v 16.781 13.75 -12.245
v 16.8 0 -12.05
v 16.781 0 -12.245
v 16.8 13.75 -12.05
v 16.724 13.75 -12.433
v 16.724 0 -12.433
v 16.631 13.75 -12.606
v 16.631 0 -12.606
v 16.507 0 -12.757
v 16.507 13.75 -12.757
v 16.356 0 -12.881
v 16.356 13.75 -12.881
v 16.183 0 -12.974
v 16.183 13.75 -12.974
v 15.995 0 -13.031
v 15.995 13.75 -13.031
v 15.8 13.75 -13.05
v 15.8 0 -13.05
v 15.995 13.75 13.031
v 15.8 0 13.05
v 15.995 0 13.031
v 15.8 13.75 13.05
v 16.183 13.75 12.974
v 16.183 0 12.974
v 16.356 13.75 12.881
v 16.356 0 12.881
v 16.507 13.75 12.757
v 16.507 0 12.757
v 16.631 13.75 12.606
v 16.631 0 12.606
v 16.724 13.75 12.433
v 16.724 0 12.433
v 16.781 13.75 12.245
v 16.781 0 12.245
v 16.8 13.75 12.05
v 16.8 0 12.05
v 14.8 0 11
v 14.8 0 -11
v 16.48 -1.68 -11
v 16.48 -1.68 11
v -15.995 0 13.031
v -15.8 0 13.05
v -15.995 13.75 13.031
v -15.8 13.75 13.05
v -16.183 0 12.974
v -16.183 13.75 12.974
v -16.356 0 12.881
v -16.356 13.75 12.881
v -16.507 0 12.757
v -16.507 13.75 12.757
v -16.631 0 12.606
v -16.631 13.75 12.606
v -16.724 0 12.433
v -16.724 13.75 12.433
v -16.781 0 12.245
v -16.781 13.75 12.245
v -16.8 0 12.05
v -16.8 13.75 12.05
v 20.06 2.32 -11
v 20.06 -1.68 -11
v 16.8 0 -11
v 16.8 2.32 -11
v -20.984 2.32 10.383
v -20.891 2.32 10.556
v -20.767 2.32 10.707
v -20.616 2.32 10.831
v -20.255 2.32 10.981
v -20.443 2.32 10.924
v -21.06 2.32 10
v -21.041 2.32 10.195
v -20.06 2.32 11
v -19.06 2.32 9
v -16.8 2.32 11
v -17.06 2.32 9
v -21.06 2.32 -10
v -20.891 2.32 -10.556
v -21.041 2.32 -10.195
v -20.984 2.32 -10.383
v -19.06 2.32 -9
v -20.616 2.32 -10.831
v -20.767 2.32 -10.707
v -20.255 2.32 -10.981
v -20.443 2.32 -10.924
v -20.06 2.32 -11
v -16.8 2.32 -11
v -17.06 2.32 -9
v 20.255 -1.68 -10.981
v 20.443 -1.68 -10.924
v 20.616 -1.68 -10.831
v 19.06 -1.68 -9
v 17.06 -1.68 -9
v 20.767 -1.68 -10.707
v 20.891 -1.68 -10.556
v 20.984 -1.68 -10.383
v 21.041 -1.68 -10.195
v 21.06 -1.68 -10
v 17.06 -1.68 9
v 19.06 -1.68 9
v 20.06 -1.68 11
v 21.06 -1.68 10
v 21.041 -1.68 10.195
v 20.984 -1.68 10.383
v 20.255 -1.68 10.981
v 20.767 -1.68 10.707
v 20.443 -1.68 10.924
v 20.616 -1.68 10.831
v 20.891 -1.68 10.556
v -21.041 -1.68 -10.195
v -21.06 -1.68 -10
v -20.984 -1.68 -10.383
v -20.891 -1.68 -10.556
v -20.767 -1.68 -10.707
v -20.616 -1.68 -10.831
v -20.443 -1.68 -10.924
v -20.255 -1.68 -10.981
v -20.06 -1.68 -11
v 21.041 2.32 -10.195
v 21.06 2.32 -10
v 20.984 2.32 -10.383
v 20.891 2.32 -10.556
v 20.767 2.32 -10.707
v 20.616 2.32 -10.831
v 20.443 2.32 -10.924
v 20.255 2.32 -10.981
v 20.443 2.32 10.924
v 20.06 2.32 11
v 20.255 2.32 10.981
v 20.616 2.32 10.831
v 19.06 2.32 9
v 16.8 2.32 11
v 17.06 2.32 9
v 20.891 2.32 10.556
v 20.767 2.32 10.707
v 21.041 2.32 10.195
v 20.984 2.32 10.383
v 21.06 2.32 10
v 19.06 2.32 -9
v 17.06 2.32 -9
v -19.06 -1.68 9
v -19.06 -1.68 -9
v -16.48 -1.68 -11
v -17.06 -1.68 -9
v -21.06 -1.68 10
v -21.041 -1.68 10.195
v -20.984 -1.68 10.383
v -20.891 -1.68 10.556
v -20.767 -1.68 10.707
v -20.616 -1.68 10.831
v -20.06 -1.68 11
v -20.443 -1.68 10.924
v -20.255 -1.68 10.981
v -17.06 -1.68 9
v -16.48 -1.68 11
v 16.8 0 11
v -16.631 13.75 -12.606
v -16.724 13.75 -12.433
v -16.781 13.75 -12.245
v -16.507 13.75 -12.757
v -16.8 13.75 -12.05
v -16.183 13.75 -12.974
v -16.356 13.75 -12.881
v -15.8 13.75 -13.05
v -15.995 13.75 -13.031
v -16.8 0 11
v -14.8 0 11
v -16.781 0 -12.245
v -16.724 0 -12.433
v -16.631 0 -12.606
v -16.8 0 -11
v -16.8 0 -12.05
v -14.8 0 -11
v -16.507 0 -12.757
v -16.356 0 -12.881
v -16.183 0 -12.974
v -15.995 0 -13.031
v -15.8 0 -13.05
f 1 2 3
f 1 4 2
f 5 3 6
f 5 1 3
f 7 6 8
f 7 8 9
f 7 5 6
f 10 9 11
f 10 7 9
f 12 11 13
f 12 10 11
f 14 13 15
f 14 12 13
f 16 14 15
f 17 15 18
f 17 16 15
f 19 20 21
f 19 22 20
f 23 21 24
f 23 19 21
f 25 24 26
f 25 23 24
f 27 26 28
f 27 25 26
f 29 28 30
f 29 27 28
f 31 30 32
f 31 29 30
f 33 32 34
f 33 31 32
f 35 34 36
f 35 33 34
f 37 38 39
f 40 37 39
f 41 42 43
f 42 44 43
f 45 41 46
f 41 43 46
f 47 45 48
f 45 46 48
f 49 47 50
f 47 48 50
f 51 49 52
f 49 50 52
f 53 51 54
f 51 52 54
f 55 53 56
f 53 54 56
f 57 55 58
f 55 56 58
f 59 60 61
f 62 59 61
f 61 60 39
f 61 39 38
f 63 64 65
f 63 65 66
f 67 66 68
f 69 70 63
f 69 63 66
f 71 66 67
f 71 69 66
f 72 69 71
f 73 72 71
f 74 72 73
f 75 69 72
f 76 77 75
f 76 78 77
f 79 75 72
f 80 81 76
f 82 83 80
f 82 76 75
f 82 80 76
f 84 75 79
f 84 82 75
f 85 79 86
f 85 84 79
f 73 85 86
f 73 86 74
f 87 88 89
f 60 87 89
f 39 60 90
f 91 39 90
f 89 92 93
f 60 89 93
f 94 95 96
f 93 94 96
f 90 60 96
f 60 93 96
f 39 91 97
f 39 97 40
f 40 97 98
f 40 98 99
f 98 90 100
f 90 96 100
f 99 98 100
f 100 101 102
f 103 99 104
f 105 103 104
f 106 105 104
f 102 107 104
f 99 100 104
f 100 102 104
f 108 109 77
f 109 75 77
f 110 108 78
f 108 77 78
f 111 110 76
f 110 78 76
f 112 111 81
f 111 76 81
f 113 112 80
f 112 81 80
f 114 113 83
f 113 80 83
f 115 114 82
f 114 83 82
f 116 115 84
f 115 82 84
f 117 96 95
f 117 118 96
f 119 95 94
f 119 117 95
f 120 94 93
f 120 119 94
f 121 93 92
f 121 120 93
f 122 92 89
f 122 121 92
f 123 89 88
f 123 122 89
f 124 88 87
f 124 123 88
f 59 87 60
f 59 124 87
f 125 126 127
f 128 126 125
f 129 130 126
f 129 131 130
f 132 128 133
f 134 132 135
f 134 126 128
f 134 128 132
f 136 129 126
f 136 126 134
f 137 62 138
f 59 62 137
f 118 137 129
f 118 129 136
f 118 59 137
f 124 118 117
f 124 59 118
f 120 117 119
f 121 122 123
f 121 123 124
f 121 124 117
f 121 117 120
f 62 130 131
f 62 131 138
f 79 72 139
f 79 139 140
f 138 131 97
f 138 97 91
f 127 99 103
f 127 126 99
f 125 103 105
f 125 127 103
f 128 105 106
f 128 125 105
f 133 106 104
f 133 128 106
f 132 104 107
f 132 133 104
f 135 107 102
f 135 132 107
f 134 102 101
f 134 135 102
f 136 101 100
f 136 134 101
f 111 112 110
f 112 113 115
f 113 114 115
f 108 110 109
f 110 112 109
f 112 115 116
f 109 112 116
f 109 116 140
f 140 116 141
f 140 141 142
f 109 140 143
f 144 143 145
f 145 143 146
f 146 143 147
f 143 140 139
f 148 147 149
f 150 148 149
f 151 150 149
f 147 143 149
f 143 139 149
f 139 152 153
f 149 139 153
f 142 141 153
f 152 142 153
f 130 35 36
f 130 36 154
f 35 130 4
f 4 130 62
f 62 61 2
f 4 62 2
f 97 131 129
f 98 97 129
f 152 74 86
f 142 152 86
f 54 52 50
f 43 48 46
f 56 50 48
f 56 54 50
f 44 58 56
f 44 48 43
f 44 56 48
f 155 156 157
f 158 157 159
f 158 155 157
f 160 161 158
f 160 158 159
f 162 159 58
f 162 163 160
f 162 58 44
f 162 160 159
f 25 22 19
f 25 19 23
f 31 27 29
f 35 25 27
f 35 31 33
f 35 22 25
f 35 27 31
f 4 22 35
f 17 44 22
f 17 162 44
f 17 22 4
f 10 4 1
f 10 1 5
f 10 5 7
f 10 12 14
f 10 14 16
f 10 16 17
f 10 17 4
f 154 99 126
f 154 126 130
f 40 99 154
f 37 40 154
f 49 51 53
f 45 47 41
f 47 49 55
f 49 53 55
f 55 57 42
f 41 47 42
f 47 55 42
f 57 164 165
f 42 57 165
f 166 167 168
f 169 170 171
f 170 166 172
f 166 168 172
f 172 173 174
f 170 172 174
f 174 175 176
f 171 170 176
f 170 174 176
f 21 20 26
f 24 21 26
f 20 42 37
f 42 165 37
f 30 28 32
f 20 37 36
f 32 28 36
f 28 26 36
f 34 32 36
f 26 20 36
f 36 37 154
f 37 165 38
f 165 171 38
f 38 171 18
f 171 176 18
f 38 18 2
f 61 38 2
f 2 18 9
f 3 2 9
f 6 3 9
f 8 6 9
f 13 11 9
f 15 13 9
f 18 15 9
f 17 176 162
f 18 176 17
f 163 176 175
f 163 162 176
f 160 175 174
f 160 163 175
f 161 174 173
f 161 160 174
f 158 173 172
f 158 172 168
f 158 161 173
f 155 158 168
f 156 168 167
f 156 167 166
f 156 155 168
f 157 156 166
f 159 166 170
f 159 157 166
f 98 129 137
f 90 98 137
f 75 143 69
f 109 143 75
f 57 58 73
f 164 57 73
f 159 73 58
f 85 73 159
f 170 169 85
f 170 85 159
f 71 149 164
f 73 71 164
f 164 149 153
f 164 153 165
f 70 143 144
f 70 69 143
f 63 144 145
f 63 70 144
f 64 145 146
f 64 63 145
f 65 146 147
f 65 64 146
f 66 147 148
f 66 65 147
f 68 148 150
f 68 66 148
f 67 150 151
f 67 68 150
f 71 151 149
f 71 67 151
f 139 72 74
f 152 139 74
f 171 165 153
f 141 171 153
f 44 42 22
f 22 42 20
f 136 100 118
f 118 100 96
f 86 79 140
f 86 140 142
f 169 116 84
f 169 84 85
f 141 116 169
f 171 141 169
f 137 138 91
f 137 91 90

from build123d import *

# Parameters (mm, degrees)
SKETCH1_W                = 33.6
SKETCH1_H                = 26.1
BOSS_EXTRUDE1_DEPTH      = 13.75
BOSS_EXTRUDE2_DEPTH      = 2.32
BOSS_EXTRUDE2_DEPTH_BACK = 1.68
SKETCH2_W                = 4.26
SKETCH2_H                = 22
SKETCH3_W                = 2
SKETCH3_H                = 18
CUT_EXTRUDE1_DEPTH       = 28.284995877
CHAMFER1_SIZE            = 2
FILLET1_R                = 1


with BuildPart() as part:
    # Sketch1 → Boss-Extrude1 (new body)
    with BuildSketch(Plane(origin=(0, 0, 0), x_dir=(1, 0, 0), z_dir=(0, 1, 0))):
        Rectangle(SKETCH1_W, SKETCH1_H)
    extrude(amount=BOSS_EXTRUDE1_DEPTH)

    # Sketch2 → Boss-Extrude2 (add, two sides: drawn at the far end of the back side and taken through both)
    with BuildSketch(Plane(origin=(0, 0, 0), x_dir=(1, 0, 0), z_dir=(0, 1, 0)).offset(-BOSS_EXTRUDE2_DEPTH_BACK)):
        with Locations((18.93, 0)):
            Rectangle(SKETCH2_W, SKETCH2_H)
        with Locations((-18.93, 0)):
            Rectangle(SKETCH2_W, SKETCH2_H)
    extrude(amount=BOSS_EXTRUDE2_DEPTH + BOSS_EXTRUDE2_DEPTH_BACK)

    # Sketch3 → Cut-Extrude1 (cut, through all)
    with BuildSketch(Plane(origin=(0, 2.32, 0), x_dir=(1, 0, 0), z_dir=(0, 1, 0))):
        with Locations((18.06, 0)):
            Rectangle(SKETCH3_W, SKETCH3_H)
        with Locations((-18.06, 0)):
            Rectangle(SKETCH3_W, SKETCH3_H)
    extrude(amount=-CUT_EXTRUDE1_DEPTH, mode=Mode.SUBTRACT)

    # Chamfer1
    # the kernel refuses this chamfer: 2 mm, written as the material it adds along each edge
    with BuildSketch(Plane(origin=(16.8, 0, -11), x_dir=(-0.9996219169112968, 0.027495876610586365, 0), z_dir=(0, 0, 1))) as chamfer1_piece_1_section:
        Polygon((CHAMFER1_SIZE * 0.999621916911, CHAMFER1_SIZE * 0.0274958766106), (-CHAMFER1_SIZE * 0.0274958766106, CHAMFER1_SIZE * 0.999621916911), (0, 0), align=None)
    chamfer1_piece_1 = extrude(amount=22, mode=Mode.PRIVATE)
    chamfer1_piece_1 = split(chamfer1_piece_1, bisect_by=Plane(origin=(16.11862069, -1.68, 0), z_dir=(0, 1, 0)), keep=Keep.TOP, mode=Mode.PRIVATE)
    add(chamfer1_piece_1)
    with BuildSketch(Plane(origin=(-16.8, 0, 11), x_dir=(0.9996219169112968, 0.027495876610586365, 0), z_dir=(0, 0, -1))) as chamfer1_piece_2_section:
        Polygon((CHAMFER1_SIZE * 0.999621916911, CHAMFER1_SIZE * 0.0274958766106), (-CHAMFER1_SIZE * 0.0274958766106, CHAMFER1_SIZE * 0.999621916911), (0, 0), align=None)
    chamfer1_piece_2 = extrude(amount=22, mode=Mode.PRIVATE)
    chamfer1_piece_2 = split(chamfer1_piece_2, bisect_by=Plane(origin=(-16.11862069, -1.68, 0), z_dir=(0, 1, 0)), keep=Keep.TOP, mode=Mode.PRIVATE)
    add(chamfer1_piece_2)

    # Fillet1
    fillet1_edges = [part.edges().sort_by_distance(p)[0] for p in [
        (21.06, 0.32, 11),
        (21.06, 0.32, -11),
        (-21.06, 0.32, -11),
        (-21.06, 0.32, 11),
        (-16.8, 6.875, -13.05),
        (16.8, 6.875, -13.05),
        (16.8, 6.875, 13.05),
        (-16.8, 6.875, 13.05),
    ]]
    fillet(fillet1_edges, radius=FILLET1_R)


solid = part.part
